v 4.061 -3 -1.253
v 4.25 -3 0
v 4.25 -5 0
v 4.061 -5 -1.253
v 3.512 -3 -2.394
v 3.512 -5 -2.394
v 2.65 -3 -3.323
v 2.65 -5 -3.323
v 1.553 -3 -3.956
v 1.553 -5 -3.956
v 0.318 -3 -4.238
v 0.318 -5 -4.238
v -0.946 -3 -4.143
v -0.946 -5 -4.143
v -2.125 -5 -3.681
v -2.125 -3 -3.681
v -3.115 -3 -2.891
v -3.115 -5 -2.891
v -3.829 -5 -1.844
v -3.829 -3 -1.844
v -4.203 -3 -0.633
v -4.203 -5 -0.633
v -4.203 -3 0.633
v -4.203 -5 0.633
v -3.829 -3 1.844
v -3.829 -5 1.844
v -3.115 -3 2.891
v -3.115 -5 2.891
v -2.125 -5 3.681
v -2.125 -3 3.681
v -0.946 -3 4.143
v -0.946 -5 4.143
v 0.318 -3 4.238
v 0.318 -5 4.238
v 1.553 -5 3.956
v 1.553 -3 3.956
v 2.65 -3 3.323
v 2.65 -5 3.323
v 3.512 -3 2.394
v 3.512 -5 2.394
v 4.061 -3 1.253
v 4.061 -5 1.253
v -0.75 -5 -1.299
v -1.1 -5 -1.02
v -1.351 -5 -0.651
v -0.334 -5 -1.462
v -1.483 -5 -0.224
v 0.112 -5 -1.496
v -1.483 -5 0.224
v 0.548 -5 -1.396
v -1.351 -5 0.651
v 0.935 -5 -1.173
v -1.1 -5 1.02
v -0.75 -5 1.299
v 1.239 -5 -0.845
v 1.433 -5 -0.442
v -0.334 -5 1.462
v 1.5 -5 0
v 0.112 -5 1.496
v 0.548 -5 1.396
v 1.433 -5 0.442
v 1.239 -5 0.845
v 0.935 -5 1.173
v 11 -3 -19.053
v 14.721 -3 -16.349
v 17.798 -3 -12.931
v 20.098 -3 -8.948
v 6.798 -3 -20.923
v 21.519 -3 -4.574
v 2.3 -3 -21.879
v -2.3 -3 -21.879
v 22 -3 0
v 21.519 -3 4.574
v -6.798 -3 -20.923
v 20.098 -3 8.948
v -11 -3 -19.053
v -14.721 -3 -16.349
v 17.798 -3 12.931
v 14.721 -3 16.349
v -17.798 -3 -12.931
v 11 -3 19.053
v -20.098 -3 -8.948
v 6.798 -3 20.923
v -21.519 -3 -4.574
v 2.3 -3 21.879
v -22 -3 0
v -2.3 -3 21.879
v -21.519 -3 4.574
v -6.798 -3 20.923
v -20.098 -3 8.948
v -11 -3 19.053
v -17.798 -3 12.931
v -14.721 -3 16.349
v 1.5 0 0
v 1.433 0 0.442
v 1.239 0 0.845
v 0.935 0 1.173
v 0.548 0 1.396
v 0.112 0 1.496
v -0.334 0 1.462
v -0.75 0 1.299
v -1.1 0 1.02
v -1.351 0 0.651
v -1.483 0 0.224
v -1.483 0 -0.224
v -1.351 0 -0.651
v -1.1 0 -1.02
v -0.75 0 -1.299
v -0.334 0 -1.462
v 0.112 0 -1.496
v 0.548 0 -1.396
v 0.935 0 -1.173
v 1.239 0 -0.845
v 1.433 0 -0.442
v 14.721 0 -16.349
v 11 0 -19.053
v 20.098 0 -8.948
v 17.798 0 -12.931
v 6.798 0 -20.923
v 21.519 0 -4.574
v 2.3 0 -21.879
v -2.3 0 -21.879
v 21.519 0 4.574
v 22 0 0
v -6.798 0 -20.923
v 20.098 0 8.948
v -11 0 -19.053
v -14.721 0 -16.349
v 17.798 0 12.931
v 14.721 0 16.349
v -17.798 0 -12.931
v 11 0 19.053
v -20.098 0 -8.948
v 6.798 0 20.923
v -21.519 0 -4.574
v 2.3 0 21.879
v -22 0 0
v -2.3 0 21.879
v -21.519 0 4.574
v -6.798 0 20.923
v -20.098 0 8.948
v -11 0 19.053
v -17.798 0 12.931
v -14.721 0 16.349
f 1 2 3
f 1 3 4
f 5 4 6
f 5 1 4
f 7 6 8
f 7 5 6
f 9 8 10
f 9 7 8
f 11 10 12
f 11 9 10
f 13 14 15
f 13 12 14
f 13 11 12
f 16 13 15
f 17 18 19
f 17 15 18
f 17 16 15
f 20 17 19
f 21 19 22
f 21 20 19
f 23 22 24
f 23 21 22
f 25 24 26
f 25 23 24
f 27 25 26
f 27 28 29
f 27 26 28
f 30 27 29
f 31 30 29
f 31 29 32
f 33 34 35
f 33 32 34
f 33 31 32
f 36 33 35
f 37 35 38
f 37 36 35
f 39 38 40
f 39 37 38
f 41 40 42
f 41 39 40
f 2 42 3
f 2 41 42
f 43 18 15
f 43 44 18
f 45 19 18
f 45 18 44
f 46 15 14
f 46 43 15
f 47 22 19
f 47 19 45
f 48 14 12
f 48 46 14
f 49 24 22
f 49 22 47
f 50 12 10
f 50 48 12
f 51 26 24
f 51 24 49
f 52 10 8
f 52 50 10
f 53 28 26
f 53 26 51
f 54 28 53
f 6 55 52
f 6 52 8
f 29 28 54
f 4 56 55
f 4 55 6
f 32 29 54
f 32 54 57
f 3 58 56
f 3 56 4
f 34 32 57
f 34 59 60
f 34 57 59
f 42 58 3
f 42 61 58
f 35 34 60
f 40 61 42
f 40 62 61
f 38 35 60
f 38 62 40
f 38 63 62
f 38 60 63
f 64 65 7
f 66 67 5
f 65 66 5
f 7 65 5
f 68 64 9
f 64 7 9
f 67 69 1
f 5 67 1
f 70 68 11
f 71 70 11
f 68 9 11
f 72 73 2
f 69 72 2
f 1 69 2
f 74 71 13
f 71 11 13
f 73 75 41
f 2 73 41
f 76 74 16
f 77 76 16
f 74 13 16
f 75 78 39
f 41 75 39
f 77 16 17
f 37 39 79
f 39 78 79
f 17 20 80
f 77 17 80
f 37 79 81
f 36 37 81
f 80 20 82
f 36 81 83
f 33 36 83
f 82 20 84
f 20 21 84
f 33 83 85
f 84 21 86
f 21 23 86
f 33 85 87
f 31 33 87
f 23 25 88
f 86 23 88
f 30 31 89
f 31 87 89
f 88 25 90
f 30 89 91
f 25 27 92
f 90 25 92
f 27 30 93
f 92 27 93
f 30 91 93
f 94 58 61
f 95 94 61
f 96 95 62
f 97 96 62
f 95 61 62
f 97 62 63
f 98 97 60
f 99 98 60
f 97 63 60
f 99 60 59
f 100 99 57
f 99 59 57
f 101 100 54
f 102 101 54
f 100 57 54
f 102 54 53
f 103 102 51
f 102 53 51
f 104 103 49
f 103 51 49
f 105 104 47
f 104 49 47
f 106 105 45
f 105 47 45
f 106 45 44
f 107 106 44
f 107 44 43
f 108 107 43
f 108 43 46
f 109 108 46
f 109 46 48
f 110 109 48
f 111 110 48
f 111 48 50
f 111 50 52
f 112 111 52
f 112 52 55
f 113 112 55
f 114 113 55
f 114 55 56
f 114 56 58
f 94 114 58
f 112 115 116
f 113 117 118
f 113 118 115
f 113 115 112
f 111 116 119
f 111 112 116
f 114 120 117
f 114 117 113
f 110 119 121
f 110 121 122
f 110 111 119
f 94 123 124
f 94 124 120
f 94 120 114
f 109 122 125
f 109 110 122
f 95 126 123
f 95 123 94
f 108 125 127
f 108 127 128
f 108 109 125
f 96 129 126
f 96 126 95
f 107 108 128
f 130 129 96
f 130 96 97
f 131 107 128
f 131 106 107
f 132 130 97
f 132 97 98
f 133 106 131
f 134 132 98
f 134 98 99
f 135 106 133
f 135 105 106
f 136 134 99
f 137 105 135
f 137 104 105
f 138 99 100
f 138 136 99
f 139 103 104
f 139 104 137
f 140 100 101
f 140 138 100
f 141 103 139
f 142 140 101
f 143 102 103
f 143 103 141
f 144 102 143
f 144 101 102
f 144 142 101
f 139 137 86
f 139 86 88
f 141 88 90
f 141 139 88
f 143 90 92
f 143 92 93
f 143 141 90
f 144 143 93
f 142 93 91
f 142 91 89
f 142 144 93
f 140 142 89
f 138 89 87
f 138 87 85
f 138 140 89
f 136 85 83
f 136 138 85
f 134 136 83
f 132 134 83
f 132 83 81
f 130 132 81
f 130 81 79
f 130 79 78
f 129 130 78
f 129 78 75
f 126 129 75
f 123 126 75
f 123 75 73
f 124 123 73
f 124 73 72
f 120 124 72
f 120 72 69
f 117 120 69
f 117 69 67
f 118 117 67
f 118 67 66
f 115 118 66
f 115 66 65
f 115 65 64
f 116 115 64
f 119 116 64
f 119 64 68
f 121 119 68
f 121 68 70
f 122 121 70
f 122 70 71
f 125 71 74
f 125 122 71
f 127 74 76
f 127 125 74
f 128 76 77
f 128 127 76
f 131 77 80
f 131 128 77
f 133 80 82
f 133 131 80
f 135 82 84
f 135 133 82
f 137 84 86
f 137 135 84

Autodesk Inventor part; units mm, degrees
ref_plane "YZ Plane" through (0, 0, 0) normal (1, 0, 0) x (0, 1, 0)
ref_plane "XZ Plane" through (0, 0, 0) normal (0, 1, 0) x (-1, 0, 0)
ref_plane "XY Plane" through (0, 0, 0) normal (0, 0, 1) x (1, 0, 0)
sketch "Эскиз1" plane through (0, 0, 0) normal (0, 1, 0) x (-1, 0, 0)
  circle A0 centre (0, 0) radius 22
  dimension "d0" = 44
extrude "Выдавливание1" add sketch "Эскиз1" against normal blind 3
sketch "Эскиз2" plane through (0, -3, 0) normal (0, -1, 0) x (1, 0, 0)
  circle A0 centre (0, 0) radius 4.25
  dimension "d3" = 8.5
extrude "Выдавливание2" add sketch "Эскиз2" along normal blind 2
sketch "Эскиз3" plane through (0, -5, 0) normal (0, -1, 0) x (1, 0, 0)
  circle A0 centre (0, 0) radius 1.5
  dimension "d6" = 3
extrude "Выдавливание3" cut sketch "Эскиз3" against normal through all
equation "\"d0\" = 14.6667 * d6"
equation "\"d3\" = 2.83333 * d6"
properties material "Медь, ковкая"
